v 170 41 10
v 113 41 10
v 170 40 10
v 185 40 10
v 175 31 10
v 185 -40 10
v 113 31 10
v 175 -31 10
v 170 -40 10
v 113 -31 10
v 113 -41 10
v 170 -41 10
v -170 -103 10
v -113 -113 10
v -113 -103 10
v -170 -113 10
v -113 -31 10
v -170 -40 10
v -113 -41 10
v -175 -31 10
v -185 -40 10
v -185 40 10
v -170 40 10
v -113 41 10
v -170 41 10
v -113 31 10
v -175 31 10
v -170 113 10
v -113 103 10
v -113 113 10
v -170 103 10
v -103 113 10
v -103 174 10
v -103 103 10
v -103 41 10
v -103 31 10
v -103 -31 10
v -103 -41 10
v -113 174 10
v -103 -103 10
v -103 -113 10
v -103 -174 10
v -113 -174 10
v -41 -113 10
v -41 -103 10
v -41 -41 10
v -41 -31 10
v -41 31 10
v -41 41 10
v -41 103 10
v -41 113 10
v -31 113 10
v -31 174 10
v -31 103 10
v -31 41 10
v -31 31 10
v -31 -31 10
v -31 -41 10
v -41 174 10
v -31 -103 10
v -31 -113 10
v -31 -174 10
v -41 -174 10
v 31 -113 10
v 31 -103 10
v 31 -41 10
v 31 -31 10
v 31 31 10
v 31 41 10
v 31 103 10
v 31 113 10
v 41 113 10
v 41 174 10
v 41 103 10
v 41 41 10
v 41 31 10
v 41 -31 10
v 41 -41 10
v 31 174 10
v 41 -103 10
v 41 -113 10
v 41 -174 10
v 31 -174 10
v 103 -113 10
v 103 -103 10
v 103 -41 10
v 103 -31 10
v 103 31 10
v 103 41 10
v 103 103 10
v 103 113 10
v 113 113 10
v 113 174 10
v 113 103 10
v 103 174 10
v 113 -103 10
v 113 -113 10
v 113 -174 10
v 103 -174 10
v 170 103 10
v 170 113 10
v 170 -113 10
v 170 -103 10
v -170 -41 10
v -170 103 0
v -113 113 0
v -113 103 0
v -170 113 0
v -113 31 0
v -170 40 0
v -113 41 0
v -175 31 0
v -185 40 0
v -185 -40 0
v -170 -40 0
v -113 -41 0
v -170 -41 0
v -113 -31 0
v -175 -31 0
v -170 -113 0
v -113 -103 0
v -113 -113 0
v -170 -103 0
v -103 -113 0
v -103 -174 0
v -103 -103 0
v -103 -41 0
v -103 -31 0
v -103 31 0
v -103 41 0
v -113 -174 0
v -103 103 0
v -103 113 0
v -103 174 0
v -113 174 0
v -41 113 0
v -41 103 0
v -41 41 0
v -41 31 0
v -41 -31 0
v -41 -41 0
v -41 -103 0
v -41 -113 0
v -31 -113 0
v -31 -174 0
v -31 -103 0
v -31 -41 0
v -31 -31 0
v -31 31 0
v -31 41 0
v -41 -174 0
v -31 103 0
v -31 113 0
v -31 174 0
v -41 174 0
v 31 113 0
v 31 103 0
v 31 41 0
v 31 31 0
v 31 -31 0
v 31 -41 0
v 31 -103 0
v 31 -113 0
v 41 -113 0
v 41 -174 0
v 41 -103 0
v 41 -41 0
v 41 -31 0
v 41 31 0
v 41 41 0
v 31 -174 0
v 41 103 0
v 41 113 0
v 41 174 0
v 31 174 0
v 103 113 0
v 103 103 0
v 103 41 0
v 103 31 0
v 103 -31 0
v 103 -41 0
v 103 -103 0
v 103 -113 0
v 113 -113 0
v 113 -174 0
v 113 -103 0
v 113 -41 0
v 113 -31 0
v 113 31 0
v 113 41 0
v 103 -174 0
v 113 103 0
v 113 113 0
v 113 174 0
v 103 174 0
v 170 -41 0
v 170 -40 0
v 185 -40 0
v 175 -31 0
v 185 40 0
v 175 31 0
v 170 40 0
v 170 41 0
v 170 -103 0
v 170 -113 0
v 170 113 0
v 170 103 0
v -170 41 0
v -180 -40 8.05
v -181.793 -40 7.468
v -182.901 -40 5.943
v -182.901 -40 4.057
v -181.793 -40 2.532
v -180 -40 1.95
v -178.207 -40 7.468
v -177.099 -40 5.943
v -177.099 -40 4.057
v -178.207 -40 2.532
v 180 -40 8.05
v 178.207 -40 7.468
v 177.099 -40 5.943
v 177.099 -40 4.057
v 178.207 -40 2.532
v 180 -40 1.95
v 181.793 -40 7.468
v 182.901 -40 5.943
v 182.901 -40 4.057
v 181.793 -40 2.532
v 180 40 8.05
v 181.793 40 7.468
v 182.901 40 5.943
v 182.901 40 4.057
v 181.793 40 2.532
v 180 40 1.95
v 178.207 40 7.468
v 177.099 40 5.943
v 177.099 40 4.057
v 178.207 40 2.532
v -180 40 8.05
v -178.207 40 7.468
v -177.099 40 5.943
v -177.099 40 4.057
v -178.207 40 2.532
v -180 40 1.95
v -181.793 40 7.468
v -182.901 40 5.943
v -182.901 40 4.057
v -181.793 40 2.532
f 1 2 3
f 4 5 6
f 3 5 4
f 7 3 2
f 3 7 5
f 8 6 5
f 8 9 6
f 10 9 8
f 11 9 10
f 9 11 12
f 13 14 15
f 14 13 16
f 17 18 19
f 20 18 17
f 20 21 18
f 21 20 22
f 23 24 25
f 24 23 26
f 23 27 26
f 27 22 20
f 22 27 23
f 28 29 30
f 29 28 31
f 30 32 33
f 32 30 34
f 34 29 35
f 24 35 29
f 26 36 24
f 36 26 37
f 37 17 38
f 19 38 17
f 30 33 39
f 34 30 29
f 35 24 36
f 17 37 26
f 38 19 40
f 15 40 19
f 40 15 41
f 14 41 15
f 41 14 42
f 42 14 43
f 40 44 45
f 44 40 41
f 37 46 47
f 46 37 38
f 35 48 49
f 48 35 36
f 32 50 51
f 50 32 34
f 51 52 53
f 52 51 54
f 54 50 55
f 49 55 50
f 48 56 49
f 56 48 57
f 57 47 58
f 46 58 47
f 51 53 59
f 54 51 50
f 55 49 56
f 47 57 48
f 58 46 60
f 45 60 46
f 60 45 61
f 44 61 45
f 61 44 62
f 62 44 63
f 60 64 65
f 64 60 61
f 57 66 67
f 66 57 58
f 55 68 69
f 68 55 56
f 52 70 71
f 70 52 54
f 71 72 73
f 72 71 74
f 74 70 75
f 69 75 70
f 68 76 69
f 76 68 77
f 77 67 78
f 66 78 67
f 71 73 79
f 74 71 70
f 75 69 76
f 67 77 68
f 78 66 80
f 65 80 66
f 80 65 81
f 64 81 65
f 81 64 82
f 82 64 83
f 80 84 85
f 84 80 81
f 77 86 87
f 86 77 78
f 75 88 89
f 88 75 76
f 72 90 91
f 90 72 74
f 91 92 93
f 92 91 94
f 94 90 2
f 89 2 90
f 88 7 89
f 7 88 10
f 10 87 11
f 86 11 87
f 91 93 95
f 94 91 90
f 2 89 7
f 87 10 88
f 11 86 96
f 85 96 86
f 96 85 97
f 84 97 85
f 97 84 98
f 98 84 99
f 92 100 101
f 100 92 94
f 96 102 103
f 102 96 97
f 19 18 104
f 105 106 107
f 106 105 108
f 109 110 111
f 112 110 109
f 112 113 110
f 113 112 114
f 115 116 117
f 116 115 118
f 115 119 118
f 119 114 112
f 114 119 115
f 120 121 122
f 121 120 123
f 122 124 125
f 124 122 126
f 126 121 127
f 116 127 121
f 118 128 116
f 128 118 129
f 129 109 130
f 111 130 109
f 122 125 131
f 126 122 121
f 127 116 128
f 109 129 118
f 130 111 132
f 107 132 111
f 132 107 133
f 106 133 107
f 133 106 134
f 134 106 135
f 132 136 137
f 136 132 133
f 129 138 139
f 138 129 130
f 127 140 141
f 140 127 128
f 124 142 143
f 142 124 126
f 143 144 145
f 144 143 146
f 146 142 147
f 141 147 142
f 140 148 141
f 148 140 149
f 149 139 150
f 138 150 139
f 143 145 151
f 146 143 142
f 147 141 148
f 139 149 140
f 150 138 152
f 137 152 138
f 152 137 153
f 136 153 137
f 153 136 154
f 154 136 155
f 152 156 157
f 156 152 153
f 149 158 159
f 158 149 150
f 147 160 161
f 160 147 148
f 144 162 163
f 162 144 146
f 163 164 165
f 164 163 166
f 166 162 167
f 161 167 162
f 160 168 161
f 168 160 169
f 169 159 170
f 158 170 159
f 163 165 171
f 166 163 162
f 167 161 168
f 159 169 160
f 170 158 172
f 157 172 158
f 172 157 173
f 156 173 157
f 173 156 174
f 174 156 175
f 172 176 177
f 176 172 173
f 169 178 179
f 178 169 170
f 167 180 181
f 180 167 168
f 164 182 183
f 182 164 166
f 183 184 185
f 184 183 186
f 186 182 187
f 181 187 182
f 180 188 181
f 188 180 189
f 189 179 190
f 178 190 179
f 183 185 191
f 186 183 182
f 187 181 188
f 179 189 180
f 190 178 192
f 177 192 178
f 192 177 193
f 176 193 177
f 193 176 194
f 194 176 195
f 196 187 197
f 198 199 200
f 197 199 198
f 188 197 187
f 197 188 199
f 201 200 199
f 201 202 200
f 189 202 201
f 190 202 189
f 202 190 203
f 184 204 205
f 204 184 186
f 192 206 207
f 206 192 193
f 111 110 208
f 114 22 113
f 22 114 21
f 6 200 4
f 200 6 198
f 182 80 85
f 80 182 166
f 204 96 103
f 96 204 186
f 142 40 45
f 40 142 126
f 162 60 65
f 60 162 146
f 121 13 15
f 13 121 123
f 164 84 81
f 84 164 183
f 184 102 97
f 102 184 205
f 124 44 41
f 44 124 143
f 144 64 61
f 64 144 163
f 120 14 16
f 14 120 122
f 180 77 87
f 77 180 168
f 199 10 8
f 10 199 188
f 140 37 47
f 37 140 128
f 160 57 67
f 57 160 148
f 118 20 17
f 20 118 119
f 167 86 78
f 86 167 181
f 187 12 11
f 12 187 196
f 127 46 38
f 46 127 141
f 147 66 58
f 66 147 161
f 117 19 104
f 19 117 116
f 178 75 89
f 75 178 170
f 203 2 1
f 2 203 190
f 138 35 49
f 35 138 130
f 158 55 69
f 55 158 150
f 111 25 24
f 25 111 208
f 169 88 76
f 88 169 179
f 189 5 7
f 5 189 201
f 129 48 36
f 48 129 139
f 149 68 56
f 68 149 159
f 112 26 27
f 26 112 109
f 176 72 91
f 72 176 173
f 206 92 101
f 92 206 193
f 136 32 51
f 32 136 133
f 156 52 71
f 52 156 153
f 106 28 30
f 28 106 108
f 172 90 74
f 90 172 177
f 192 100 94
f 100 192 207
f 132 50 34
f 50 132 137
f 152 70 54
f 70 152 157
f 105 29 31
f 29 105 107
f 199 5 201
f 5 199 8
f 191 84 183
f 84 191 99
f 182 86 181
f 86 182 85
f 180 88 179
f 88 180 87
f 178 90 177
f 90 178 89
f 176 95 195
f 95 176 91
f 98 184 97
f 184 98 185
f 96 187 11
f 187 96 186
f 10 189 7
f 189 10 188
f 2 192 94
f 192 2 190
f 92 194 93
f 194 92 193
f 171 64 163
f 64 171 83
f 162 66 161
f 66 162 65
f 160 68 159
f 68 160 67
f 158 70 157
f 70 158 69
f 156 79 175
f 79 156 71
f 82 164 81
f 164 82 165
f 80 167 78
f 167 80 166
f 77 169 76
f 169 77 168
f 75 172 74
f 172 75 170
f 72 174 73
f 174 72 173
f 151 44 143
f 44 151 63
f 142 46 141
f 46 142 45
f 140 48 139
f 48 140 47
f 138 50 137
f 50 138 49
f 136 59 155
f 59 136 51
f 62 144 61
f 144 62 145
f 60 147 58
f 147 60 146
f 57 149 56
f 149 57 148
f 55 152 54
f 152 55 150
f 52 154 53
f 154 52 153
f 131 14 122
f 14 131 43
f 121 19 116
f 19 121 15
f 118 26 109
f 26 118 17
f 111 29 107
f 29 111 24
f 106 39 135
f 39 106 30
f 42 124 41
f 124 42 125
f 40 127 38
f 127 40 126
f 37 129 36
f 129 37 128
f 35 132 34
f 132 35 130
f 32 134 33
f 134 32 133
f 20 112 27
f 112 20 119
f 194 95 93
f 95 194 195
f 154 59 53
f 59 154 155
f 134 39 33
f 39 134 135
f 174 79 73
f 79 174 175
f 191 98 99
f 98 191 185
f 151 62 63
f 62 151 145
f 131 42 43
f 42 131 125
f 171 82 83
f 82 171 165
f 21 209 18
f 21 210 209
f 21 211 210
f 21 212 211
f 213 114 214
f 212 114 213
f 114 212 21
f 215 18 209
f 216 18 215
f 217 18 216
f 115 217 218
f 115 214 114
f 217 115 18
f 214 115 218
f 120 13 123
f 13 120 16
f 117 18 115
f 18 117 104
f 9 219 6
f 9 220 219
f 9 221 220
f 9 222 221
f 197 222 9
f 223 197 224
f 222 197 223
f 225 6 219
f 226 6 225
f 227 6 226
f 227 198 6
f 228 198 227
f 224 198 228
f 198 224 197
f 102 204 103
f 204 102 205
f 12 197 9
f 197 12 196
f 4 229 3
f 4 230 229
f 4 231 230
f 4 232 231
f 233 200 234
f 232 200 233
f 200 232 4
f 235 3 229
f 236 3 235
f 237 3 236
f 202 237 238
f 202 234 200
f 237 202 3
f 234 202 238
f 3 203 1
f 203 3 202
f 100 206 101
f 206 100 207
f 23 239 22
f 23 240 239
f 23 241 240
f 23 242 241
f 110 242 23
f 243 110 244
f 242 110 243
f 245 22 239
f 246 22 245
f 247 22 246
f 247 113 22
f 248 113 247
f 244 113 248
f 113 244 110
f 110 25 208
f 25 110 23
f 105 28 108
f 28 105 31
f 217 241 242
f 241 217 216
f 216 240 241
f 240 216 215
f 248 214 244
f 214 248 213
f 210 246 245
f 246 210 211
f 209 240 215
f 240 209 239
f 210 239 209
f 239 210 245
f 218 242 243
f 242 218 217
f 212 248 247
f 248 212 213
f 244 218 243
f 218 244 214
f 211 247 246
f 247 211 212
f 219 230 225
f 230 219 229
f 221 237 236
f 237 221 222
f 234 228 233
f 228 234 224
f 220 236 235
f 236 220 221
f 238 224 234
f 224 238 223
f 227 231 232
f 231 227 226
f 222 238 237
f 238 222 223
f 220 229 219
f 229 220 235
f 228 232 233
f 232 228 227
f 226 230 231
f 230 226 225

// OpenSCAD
rotate([0, 0, 90]) translate([0, 0, 5]) difference()
{
  union()
  {
    for(x = [-370 / 2 + 5:72:220])
    {
      translate([x, 0, 0]) cube([10, 370, 10], center = true);
    }

    for(y = [-370 / 2 + 5:72:220])
    {
      translate([0, y, 0]) cube([370, 10, 10], center = true);
    }
  }

  translate([364, 0, 0]) cube([380, 380, 20], center = true);
  translate([-364, 0, 0]) cube([380, 380, 20], center = true);

  translate([-140, 220, 0]) cube([200, 100, 20], center = true);
  translate([-140, -220, 0]) cube([200, 100, 20], center = true);
  translate([140, -220, 0]) cube([200, 100, 20], center = true);
  translate([140, 220, 0]) cube([200, 100, 20], center = true);

  translate([0, 180, 0]) rotate([0, 90, 0]) cylinder(h = 1000, d = 6.1, center = true);
  translate([0, -180, 0]) rotate([0, 90, 0]) cylinder(h = 1000, d = 6.1, center = true);
}
